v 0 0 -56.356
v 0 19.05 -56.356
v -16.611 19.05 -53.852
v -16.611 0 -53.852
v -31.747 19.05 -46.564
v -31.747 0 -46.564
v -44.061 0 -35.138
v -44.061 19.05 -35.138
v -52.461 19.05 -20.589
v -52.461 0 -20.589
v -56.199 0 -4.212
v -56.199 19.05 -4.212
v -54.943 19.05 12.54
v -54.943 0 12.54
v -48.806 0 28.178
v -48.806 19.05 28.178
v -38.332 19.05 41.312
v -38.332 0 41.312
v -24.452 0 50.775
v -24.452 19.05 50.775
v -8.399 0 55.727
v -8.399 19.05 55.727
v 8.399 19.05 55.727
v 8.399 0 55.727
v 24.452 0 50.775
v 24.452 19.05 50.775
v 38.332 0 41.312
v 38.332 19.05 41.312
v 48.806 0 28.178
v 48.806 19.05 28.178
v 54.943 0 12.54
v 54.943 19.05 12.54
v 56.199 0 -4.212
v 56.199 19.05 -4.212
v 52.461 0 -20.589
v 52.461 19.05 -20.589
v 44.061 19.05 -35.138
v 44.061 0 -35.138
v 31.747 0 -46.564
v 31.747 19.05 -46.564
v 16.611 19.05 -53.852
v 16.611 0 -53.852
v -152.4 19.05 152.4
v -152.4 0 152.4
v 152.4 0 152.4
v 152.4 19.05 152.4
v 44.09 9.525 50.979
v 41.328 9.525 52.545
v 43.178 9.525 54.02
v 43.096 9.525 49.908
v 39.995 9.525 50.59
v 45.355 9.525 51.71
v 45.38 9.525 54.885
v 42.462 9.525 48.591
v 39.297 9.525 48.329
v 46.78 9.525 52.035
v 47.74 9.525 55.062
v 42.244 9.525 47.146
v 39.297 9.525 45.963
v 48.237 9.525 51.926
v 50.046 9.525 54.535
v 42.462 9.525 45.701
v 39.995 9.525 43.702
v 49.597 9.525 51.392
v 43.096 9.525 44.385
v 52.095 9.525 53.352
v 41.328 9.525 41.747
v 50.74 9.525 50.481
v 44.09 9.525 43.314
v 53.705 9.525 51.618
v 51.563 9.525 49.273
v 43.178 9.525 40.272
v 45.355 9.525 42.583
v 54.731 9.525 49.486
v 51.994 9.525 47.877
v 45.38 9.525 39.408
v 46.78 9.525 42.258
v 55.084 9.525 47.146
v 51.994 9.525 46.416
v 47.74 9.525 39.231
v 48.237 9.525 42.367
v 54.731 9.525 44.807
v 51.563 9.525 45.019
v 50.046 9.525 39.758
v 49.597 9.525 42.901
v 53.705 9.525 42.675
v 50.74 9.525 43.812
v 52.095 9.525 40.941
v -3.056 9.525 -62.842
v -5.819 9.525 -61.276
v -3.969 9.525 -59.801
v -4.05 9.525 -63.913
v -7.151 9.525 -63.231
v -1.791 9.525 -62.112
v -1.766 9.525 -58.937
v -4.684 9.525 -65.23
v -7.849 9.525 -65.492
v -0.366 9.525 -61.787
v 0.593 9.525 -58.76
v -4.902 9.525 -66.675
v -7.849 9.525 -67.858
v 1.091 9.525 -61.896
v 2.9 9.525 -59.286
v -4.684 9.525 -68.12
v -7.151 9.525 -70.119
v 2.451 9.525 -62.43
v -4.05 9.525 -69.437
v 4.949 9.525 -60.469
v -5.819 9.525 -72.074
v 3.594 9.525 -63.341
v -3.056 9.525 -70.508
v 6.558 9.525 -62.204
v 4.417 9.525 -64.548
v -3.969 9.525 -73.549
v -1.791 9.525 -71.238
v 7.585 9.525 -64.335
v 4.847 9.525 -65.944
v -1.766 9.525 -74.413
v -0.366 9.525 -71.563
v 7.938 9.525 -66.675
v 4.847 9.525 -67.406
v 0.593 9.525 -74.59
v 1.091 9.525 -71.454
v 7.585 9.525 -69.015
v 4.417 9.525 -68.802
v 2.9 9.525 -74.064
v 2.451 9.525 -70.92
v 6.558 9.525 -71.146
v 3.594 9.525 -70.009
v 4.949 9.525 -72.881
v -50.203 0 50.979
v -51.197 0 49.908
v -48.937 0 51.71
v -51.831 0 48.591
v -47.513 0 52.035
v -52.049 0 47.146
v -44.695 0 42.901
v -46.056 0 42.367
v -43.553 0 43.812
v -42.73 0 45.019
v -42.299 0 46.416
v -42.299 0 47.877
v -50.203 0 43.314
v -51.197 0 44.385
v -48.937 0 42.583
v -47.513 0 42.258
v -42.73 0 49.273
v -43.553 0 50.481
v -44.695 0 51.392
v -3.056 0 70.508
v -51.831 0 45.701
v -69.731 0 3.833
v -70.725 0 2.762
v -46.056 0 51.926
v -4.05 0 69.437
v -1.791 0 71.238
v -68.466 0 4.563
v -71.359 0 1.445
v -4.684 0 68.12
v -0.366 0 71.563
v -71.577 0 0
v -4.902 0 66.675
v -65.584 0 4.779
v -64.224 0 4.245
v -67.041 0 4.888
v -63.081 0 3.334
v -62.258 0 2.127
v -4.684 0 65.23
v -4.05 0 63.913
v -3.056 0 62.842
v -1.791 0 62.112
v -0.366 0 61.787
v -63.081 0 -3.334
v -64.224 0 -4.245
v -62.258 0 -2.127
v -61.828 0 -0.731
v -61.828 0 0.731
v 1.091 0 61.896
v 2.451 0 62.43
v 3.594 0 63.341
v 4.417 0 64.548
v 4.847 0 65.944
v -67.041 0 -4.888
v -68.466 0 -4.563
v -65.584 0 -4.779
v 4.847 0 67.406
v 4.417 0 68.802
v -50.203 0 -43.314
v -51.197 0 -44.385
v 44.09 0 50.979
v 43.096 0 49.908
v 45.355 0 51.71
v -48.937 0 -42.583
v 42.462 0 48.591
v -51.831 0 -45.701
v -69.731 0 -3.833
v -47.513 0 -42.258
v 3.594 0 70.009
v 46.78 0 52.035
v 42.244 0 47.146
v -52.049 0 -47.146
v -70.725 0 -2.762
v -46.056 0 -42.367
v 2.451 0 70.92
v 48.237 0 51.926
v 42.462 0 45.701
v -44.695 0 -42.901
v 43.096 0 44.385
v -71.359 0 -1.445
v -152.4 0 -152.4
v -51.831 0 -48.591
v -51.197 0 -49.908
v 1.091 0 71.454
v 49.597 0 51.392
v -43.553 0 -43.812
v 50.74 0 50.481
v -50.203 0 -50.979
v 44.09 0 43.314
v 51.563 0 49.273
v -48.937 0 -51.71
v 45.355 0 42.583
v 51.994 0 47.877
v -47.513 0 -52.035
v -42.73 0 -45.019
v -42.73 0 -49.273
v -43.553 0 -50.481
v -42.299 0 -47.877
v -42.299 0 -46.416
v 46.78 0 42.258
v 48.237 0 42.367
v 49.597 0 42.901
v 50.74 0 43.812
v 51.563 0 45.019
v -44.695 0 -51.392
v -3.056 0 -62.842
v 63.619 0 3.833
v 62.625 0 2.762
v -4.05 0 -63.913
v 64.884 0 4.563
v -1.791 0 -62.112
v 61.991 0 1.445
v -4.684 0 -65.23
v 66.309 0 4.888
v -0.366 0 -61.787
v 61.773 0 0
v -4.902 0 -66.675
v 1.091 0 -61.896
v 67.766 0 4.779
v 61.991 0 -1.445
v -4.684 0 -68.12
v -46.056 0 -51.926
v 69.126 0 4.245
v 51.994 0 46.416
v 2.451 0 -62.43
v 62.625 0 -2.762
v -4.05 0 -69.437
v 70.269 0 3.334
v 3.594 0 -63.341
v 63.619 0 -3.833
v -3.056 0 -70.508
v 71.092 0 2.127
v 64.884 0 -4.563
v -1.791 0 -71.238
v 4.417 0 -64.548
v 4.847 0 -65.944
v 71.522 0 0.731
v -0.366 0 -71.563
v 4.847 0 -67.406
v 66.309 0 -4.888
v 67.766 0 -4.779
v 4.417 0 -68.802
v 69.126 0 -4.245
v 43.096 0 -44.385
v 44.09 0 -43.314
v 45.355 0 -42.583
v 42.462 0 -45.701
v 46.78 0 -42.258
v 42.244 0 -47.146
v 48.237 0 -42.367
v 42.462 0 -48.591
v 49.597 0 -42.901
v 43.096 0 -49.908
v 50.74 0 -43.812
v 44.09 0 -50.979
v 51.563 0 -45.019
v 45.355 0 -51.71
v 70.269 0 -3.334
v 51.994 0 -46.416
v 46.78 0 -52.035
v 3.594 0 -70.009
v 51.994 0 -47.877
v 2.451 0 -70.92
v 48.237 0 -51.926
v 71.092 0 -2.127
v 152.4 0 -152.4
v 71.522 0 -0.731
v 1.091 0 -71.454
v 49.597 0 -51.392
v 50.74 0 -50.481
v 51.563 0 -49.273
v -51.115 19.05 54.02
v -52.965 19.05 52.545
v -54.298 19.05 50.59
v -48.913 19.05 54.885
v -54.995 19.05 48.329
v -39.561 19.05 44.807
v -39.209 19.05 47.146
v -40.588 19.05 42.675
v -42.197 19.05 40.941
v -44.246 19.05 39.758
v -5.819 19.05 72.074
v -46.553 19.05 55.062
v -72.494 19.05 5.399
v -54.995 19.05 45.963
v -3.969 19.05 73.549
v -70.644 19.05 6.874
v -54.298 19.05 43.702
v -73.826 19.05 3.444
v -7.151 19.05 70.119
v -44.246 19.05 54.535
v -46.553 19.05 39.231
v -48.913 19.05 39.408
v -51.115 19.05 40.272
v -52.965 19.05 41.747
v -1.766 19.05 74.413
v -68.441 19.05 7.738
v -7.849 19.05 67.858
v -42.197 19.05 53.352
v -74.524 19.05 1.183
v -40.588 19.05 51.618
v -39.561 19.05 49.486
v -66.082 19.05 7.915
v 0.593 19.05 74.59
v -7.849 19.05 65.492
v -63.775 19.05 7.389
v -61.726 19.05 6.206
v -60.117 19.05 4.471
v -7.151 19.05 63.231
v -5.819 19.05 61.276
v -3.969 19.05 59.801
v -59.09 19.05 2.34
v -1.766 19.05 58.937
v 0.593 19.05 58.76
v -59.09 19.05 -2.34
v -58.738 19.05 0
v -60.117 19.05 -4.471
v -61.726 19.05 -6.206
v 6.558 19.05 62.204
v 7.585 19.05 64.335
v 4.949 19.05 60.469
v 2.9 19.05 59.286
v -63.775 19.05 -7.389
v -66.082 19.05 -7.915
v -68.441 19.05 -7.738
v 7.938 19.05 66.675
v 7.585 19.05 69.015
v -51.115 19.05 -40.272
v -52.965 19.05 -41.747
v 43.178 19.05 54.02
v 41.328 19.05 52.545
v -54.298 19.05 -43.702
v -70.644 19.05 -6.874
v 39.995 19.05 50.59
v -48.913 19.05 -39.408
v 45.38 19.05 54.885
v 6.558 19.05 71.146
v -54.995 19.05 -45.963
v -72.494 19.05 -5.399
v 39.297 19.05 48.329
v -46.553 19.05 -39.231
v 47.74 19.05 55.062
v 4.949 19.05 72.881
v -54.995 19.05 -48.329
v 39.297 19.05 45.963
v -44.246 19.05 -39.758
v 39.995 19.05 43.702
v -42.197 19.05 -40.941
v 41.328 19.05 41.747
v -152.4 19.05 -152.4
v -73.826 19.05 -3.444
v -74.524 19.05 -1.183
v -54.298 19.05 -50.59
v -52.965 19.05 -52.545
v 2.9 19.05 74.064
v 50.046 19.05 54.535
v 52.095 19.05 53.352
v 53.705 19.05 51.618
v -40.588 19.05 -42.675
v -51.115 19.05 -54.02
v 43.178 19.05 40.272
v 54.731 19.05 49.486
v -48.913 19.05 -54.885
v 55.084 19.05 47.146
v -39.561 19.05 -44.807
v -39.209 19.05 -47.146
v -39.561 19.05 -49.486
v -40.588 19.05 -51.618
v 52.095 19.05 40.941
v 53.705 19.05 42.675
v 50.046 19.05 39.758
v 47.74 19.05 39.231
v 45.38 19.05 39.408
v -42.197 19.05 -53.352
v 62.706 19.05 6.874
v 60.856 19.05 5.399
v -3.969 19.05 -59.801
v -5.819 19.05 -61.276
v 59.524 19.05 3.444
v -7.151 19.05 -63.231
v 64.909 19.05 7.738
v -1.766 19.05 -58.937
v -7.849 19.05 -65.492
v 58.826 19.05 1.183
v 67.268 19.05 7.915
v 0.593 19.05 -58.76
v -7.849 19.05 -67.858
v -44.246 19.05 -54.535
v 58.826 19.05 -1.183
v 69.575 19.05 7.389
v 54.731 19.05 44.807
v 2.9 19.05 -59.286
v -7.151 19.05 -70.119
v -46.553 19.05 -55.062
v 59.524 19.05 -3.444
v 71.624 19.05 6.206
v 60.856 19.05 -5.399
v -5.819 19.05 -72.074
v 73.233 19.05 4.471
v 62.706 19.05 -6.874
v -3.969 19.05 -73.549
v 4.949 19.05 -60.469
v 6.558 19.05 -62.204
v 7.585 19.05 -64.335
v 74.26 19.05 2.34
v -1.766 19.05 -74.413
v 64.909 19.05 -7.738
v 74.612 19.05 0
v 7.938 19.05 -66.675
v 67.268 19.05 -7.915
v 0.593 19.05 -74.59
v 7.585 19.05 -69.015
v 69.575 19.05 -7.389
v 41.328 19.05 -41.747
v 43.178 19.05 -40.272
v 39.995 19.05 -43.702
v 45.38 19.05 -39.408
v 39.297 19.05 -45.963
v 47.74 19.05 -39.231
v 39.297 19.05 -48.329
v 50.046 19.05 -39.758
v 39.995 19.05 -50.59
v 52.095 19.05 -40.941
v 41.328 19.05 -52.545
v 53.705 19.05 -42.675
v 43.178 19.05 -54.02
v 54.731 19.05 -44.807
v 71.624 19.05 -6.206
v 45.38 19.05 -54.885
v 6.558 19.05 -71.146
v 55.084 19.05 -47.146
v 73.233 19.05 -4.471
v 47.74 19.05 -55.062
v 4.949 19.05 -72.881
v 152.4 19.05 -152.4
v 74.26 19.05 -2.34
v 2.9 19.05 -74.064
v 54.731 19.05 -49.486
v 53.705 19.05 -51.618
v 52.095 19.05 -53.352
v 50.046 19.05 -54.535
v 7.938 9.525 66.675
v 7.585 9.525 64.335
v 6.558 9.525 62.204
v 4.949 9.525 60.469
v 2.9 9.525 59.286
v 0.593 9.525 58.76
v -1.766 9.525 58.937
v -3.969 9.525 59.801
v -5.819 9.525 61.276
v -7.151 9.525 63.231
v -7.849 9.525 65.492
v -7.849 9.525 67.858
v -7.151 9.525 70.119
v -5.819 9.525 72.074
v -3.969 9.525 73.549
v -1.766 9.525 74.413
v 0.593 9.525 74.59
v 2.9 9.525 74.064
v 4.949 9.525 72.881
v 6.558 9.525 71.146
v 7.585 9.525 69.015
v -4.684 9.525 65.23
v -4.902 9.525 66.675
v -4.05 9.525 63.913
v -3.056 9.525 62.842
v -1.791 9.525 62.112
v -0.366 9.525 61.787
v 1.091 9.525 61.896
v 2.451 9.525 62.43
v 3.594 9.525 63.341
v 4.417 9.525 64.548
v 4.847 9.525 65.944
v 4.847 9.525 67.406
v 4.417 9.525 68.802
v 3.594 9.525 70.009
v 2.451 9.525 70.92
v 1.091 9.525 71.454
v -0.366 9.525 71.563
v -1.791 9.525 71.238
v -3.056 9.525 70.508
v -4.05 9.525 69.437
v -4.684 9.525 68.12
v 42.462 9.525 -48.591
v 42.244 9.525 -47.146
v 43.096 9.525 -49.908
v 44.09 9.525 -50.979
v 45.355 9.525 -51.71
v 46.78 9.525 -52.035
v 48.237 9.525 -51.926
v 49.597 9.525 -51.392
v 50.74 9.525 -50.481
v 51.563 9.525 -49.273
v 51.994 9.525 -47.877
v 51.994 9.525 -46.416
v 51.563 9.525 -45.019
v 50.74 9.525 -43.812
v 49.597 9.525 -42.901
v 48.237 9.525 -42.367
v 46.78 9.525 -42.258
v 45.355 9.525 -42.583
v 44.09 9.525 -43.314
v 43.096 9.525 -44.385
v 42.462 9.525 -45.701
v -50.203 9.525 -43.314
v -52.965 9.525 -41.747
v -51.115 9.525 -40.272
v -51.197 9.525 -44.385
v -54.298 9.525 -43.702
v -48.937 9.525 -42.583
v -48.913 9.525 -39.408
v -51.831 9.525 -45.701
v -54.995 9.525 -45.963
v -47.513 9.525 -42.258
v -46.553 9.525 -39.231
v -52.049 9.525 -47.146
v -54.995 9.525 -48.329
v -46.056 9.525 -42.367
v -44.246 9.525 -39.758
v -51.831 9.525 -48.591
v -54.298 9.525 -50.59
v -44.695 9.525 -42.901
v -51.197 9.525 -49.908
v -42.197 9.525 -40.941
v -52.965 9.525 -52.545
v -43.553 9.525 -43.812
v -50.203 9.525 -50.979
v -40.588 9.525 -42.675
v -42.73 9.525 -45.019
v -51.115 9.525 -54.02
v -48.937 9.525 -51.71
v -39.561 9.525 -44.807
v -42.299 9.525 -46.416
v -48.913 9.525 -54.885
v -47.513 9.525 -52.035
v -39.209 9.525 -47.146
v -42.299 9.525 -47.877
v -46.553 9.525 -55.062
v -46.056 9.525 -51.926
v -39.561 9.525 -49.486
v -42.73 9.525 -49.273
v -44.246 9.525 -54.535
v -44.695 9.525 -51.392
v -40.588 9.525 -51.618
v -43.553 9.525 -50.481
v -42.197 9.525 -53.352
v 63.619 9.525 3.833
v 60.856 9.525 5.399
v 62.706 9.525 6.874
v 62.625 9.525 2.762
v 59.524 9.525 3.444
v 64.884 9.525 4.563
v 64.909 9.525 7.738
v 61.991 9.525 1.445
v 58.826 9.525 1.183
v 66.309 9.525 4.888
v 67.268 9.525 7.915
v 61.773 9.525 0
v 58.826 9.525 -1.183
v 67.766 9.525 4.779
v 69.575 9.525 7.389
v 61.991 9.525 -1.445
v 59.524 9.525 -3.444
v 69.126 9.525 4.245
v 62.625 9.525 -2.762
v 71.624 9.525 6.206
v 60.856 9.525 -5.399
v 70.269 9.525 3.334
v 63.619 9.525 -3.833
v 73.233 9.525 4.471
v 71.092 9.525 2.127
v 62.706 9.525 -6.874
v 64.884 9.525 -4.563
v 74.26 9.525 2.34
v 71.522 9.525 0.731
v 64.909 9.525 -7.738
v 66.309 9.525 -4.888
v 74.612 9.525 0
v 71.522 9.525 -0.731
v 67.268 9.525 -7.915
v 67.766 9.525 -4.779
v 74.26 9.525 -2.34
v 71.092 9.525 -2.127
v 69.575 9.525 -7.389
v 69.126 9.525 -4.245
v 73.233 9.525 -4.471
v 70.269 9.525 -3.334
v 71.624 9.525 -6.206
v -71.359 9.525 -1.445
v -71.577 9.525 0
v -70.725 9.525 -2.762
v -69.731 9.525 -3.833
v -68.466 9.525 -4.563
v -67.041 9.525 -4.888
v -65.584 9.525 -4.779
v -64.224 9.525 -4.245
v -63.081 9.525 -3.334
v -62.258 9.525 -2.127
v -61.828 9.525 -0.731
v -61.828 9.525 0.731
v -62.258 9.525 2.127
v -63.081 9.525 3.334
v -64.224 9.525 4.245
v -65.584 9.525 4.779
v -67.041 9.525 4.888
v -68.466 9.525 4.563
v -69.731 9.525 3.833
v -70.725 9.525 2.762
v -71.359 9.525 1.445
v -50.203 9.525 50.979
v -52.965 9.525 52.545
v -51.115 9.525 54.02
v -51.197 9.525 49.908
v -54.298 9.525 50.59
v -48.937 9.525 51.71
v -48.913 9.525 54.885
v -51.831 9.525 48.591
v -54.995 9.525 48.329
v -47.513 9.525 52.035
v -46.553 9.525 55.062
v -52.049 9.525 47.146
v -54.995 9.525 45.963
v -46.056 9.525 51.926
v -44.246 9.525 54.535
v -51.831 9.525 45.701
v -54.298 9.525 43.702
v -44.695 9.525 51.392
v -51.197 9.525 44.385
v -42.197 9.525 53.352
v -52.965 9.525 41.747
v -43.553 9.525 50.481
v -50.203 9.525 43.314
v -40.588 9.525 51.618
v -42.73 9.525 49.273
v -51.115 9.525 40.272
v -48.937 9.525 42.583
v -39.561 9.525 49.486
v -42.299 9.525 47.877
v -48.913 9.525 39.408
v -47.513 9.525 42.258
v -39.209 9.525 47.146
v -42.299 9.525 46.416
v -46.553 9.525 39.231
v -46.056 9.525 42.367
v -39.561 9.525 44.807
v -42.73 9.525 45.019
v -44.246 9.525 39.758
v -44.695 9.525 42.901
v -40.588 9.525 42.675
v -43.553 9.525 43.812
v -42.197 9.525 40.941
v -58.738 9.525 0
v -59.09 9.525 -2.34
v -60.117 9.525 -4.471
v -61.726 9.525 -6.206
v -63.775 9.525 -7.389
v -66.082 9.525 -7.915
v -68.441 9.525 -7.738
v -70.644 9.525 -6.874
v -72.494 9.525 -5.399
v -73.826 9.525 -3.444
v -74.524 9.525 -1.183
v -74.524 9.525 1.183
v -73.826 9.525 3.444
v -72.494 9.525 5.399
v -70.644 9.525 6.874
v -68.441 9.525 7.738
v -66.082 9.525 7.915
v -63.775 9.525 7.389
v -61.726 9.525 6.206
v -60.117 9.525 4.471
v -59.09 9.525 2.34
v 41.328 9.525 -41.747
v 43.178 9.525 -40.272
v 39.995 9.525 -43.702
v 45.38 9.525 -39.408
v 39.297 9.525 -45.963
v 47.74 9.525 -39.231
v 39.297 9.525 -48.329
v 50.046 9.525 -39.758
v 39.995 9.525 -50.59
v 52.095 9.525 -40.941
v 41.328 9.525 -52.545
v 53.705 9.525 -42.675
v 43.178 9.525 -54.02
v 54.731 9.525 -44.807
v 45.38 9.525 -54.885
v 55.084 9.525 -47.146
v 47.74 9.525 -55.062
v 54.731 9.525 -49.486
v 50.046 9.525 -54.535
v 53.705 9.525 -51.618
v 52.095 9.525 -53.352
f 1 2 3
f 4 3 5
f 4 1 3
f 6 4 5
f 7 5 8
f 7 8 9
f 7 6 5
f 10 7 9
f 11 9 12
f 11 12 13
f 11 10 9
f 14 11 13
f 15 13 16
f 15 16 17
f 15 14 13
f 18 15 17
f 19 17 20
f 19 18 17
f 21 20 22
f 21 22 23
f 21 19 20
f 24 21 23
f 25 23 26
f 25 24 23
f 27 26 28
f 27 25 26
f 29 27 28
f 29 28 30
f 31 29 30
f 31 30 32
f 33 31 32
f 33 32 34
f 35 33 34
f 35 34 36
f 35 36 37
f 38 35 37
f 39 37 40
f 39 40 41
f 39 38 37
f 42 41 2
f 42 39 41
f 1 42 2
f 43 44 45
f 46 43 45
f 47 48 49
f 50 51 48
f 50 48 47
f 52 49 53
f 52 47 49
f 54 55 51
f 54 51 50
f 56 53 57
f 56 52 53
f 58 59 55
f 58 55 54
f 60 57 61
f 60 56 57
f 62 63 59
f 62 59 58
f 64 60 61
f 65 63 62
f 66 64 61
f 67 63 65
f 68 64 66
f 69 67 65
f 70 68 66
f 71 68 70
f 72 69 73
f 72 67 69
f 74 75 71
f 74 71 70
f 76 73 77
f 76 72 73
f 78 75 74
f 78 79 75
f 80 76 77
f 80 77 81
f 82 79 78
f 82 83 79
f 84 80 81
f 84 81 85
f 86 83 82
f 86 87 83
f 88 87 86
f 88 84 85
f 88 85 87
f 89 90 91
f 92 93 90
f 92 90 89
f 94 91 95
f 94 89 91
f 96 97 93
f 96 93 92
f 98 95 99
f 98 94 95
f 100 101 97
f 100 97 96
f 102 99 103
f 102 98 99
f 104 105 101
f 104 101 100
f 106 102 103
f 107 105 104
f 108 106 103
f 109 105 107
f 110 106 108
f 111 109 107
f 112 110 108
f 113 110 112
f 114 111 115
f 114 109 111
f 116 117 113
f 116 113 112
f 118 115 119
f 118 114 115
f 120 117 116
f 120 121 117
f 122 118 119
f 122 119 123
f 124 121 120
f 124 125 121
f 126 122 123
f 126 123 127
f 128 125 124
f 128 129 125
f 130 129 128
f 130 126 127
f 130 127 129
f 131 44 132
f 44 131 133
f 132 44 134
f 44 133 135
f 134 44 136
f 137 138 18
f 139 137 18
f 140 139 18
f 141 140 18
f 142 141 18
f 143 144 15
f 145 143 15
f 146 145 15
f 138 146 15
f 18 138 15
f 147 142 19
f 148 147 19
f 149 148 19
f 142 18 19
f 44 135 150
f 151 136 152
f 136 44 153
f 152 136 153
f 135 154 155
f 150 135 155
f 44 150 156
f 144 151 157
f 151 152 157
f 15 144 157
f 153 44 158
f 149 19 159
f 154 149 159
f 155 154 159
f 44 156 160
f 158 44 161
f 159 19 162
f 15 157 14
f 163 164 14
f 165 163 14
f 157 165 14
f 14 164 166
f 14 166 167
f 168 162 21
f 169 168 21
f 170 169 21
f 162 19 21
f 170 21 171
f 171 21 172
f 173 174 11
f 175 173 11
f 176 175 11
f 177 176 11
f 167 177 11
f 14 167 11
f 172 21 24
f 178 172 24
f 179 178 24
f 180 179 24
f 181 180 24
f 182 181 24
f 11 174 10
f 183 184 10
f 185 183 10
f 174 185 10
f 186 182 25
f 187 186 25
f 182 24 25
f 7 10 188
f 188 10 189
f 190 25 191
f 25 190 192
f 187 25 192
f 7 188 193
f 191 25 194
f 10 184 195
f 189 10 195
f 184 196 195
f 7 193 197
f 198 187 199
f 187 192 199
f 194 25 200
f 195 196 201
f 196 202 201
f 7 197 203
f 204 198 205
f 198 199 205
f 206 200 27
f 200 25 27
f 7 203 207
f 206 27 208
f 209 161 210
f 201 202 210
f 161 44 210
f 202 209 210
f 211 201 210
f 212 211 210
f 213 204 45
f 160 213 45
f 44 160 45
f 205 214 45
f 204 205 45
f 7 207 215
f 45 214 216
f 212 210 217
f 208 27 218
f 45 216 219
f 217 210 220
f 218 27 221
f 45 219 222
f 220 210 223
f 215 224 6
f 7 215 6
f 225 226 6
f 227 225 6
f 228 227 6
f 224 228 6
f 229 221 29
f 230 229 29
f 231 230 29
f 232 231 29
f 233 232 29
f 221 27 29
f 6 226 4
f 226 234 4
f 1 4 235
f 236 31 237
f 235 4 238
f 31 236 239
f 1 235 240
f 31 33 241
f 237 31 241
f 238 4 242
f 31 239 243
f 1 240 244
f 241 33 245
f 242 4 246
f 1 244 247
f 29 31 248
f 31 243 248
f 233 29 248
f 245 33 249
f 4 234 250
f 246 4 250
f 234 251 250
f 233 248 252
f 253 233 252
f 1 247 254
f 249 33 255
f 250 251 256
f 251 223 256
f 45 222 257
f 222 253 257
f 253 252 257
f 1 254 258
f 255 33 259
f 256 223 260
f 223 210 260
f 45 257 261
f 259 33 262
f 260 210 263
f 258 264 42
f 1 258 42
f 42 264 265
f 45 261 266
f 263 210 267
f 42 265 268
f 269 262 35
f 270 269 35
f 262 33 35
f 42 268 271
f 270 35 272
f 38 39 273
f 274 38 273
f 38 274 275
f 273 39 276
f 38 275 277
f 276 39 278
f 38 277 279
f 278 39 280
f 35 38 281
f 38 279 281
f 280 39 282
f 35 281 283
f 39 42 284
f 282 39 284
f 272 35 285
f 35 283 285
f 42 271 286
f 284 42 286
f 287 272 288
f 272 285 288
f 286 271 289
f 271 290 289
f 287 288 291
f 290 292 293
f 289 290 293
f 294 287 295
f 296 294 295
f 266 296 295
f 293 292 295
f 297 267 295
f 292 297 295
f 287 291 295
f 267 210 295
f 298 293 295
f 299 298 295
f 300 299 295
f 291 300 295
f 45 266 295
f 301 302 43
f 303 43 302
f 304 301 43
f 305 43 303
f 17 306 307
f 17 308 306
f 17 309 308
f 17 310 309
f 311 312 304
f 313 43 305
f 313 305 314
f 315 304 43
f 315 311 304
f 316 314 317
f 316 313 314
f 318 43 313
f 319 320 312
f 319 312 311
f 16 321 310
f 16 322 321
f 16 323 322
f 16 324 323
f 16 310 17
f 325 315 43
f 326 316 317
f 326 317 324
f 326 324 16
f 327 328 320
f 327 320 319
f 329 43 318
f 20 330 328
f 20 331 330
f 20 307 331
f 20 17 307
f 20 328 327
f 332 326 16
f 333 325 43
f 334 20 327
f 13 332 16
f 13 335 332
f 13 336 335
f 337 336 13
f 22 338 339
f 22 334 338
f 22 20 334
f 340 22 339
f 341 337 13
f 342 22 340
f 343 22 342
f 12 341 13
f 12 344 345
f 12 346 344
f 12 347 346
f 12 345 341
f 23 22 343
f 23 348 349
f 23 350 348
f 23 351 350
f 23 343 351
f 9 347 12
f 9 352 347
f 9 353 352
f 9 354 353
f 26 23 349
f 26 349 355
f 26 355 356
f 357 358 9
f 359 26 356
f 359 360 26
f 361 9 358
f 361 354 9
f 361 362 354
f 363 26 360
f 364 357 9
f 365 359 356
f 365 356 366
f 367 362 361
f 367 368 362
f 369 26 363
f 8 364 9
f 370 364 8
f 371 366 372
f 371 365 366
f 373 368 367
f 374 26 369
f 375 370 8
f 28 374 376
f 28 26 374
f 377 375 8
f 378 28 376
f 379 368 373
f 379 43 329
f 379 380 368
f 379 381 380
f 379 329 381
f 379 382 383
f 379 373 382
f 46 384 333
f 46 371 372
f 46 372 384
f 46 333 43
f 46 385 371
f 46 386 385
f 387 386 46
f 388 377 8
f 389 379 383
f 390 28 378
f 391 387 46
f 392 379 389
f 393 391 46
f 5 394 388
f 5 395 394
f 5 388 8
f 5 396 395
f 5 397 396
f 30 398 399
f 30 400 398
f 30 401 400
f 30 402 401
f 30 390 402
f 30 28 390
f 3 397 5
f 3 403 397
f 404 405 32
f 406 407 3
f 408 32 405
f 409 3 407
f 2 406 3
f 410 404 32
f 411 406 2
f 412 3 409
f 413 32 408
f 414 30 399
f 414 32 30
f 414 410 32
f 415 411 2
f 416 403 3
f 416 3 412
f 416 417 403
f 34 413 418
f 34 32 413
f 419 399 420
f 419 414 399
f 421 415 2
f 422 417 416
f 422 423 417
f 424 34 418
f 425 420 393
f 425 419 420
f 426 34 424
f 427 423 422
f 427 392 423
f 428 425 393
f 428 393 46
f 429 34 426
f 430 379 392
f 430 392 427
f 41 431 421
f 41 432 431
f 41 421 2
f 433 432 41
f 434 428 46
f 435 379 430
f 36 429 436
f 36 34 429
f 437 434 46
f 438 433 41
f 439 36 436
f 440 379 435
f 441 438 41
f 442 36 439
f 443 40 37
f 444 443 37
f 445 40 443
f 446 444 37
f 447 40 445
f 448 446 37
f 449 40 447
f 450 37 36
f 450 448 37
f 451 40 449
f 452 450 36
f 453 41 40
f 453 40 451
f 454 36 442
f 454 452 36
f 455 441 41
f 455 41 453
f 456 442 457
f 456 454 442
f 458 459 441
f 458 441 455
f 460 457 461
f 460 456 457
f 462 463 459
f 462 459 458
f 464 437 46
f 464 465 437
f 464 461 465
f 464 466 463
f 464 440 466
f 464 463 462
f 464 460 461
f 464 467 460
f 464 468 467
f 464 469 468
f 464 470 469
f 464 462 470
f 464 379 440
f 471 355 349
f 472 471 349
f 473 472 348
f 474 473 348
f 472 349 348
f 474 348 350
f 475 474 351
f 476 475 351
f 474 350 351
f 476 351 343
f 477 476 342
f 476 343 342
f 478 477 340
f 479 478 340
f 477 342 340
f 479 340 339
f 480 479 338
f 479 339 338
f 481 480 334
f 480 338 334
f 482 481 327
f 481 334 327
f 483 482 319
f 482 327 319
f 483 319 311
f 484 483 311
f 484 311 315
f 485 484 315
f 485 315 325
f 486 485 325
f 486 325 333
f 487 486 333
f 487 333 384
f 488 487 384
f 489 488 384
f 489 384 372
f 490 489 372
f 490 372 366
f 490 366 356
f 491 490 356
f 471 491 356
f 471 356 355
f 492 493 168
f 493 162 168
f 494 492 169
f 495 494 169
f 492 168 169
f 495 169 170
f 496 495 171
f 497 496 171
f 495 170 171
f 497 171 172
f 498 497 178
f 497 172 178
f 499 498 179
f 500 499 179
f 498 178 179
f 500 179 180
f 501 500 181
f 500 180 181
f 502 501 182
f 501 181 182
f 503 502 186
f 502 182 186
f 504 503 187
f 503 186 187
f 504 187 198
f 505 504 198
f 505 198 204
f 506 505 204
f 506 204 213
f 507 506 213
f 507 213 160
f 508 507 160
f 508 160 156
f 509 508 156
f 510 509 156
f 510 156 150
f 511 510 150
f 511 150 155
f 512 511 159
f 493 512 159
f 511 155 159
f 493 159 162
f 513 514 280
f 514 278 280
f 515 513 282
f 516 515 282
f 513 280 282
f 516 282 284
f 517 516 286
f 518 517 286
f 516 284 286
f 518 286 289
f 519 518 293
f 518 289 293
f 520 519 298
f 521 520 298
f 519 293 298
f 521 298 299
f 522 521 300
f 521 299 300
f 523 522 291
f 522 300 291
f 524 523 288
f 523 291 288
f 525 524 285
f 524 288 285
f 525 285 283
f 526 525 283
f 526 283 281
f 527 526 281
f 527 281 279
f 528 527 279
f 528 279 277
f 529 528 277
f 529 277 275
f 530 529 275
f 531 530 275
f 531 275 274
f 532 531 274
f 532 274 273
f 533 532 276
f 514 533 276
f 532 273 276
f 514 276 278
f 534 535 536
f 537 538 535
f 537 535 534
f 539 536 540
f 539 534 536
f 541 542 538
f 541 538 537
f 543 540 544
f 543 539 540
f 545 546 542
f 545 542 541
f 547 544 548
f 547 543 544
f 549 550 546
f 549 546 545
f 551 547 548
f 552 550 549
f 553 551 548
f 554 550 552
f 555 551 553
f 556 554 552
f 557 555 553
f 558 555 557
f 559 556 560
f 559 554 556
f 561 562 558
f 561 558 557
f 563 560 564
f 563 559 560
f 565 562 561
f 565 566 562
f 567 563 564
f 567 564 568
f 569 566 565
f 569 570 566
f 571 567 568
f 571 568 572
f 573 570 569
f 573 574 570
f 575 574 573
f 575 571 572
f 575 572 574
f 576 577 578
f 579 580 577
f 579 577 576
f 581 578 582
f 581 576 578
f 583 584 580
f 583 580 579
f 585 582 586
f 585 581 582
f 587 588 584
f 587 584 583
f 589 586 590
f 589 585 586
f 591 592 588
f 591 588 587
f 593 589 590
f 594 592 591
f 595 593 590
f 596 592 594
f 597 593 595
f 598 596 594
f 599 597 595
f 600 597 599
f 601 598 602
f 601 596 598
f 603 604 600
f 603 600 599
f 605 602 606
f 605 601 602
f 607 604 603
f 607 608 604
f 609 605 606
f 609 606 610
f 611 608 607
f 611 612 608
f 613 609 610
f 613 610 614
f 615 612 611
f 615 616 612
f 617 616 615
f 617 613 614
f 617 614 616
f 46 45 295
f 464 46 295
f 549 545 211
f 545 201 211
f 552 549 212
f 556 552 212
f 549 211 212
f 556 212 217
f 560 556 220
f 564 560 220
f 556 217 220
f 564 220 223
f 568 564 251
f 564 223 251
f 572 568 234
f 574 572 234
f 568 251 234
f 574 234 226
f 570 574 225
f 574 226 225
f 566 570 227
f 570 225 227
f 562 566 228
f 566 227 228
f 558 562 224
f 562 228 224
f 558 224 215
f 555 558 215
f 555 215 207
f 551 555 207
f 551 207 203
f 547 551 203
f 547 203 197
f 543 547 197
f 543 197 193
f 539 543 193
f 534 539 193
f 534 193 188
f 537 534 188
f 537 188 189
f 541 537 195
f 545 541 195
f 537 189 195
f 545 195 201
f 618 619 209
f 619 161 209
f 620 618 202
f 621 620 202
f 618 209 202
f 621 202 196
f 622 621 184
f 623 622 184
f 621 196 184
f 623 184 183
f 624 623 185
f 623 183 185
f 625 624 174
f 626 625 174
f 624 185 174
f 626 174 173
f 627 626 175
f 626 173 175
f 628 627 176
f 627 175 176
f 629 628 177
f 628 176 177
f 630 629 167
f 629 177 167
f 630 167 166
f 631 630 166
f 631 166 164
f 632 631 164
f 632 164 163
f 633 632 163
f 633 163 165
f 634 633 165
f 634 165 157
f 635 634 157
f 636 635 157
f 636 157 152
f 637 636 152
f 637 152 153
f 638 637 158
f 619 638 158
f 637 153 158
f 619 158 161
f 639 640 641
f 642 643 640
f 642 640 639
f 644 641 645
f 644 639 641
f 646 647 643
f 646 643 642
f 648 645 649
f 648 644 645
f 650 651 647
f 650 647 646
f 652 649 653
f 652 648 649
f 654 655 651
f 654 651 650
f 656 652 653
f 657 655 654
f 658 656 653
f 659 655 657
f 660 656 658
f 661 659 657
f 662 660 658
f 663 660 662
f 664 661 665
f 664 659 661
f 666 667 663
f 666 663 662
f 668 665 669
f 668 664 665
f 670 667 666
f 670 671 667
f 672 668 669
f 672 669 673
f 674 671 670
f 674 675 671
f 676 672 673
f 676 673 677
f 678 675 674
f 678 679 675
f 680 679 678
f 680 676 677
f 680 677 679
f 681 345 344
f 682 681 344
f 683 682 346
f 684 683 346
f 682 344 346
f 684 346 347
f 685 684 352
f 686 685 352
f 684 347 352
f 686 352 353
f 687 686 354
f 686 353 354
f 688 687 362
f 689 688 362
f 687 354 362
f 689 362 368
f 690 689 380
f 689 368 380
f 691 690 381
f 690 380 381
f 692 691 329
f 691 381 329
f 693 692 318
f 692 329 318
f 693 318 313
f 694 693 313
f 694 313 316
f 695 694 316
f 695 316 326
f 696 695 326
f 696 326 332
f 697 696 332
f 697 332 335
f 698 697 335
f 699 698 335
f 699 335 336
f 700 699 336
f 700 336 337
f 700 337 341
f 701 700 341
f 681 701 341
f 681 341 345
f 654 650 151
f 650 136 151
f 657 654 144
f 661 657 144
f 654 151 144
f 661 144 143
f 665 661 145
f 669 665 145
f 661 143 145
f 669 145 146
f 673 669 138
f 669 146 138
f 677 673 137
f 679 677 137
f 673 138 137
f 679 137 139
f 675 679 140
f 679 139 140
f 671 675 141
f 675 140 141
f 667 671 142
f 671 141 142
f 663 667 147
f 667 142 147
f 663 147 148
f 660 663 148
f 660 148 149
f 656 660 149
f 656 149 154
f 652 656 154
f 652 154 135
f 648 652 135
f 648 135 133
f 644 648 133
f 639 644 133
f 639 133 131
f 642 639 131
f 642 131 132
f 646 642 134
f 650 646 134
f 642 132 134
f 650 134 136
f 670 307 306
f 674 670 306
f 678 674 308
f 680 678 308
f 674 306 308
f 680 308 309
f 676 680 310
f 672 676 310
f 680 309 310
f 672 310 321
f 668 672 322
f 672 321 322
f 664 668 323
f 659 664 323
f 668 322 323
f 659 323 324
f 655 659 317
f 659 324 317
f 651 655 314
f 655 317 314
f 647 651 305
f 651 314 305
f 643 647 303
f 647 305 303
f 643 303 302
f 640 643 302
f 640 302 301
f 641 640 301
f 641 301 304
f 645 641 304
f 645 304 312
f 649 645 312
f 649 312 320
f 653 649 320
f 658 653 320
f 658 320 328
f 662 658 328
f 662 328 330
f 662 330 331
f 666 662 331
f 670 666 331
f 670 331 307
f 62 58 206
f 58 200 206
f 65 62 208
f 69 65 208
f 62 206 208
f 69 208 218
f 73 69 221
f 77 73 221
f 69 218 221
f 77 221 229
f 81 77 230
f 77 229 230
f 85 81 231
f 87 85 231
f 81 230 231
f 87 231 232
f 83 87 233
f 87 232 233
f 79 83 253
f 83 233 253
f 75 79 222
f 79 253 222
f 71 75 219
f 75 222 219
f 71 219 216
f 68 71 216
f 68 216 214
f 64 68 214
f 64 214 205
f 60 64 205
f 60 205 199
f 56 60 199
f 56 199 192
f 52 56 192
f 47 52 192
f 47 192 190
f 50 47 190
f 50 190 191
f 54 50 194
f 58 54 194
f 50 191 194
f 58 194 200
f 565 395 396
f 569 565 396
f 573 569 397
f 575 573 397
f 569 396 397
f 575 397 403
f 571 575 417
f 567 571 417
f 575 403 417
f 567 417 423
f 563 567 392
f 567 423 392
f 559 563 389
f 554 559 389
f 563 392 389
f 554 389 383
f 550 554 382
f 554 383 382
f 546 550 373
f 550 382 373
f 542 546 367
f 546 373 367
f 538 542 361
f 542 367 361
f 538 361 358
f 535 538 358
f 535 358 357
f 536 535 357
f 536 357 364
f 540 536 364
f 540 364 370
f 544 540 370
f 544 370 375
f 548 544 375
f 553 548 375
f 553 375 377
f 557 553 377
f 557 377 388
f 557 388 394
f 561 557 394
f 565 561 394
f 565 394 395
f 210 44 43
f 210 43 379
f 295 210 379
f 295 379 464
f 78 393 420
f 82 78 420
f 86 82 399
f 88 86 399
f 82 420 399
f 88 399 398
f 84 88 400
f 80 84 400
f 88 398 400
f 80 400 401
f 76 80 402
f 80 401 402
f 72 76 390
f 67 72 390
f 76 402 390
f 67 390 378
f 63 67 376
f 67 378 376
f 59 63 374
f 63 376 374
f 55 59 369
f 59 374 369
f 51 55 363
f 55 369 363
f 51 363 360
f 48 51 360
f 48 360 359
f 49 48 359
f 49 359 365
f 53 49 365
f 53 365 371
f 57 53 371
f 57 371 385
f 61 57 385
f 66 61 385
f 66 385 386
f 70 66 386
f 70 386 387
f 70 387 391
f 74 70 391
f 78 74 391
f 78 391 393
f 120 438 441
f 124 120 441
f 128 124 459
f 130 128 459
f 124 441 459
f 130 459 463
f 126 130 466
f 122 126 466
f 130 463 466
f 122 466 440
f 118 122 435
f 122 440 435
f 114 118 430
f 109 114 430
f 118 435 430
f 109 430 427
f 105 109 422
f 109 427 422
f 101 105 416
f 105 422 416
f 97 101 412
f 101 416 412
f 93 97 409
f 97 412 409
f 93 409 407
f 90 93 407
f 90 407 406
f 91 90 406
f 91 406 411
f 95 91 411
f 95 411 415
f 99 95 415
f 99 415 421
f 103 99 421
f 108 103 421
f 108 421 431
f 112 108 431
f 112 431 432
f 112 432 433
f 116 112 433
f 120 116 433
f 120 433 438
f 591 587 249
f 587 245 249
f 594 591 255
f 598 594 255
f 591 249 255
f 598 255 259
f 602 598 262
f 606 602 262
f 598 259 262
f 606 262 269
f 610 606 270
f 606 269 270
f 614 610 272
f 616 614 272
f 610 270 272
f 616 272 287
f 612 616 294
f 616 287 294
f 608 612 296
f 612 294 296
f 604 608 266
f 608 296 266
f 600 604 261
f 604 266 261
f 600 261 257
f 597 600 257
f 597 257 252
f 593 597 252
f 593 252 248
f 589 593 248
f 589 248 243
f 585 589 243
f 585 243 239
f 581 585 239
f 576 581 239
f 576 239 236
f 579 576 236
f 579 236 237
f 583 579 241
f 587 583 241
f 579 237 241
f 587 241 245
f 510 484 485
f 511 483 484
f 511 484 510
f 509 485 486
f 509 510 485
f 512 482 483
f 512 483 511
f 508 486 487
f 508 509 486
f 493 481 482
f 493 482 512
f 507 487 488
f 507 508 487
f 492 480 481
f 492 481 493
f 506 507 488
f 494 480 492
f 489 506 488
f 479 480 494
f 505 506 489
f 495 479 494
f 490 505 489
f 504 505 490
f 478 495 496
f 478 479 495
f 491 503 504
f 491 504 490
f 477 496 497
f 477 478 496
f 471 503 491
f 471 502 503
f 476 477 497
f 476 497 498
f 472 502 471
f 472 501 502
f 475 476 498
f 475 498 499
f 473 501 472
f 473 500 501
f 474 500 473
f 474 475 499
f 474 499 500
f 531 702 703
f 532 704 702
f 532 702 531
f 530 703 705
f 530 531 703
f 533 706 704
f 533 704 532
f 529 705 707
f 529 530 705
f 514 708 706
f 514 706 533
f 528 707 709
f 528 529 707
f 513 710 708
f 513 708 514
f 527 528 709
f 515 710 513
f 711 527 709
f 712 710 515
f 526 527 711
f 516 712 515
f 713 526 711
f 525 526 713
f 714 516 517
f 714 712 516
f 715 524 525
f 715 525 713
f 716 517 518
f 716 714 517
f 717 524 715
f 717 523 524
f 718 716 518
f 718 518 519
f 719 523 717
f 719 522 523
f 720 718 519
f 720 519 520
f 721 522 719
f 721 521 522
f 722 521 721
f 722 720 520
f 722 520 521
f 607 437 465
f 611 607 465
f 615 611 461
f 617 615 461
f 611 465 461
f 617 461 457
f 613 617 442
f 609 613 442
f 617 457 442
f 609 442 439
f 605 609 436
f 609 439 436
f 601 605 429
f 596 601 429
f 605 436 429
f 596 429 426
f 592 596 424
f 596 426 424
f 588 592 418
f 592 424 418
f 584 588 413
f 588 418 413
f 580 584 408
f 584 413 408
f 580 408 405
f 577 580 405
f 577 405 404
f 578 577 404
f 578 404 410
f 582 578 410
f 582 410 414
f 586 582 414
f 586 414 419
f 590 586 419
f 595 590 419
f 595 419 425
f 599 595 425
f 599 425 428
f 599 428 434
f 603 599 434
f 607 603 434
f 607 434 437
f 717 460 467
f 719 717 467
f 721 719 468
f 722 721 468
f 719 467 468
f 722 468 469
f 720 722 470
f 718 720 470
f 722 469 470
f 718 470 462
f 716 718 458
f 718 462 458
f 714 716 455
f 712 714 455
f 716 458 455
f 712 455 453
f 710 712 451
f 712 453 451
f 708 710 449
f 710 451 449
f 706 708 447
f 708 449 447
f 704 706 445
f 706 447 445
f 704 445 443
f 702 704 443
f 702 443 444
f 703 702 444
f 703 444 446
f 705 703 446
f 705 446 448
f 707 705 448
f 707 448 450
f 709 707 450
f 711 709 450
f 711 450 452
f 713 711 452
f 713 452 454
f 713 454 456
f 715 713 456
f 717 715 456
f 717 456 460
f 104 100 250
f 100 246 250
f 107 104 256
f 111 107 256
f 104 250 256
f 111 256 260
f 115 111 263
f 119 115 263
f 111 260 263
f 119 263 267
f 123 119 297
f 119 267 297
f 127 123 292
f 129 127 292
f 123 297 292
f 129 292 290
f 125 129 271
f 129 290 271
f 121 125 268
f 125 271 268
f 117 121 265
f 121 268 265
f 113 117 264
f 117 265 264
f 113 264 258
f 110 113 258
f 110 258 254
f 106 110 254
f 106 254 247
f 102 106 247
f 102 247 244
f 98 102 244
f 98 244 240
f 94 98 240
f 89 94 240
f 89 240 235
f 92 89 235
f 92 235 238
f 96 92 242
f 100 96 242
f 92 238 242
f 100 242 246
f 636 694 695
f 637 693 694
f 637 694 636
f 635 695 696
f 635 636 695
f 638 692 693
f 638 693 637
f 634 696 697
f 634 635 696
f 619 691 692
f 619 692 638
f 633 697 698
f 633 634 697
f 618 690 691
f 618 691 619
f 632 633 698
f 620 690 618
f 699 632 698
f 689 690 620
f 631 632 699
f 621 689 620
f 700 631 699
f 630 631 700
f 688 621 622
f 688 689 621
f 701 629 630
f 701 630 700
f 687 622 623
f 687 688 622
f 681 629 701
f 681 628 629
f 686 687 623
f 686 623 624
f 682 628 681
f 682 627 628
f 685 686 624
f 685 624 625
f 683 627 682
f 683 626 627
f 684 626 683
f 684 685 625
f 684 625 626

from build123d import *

# Parameters (mm, degrees)
SKETCH1_W                                        = 304.8
SKETCH1_H                                        = 304.8
SKETCH1_R                                        = 56.35625
BOSS_EXTRUDE1_DEPTH                              = 19.05
CBORE_FOR_3_8_SOCKET_HEAD_CAP_SCREW1_D           = 9.8044
CBORE_FOR_3_8_SOCKET_HEAD_CAP_SCREW1_CBORE_D     = 15.875
CBORE_FOR_3_8_SOCKET_HEAD_CAP_SCREW1_CBORE_DEPTH = 9.525


with BuildPart() as part:
    # Sketch1 → Boss-Extrude1 (new body)
    with BuildSketch(Plane(origin=(0, 0, 0), x_dir=(1, 0, 0), z_dir=(0, 1, 0))):
        Rectangle(SKETCH1_W, SKETCH1_H)
        with Locations(Location((0, 0, 0), (0, 0, 90))):
            Circle(SKETCH1_R, mode=Mode.SUBTRACT)
    extrude(amount=BOSS_EXTRUDE1_DEPTH)

    # CBORE for 3/8 Socket Head Cap Screw1 (through all)
    with Locations(Plane(origin=(0, 19.05, 0), x_dir=(1, 0, 0), z_dir=(0, 1, 0))):
        with Locations((47.146344636, -47.146344636), (66.675, 0), (47.146344636, 47.146344636), (0, 66.675), (-47.146344636, 47.146344636), (-66.675, 0), (-47.146344636, -47.146344636), (0, -66.675)):
            CounterBoreHole(CBORE_FOR_3_8_SOCKET_HEAD_CAP_SCREW1_D / 2, CBORE_FOR_3_8_SOCKET_HEAD_CAP_SCREW1_CBORE_D / 2, CBORE_FOR_3_8_SOCKET_HEAD_CAP_SCREW1_CBORE_DEPTH)


solid = part.part
